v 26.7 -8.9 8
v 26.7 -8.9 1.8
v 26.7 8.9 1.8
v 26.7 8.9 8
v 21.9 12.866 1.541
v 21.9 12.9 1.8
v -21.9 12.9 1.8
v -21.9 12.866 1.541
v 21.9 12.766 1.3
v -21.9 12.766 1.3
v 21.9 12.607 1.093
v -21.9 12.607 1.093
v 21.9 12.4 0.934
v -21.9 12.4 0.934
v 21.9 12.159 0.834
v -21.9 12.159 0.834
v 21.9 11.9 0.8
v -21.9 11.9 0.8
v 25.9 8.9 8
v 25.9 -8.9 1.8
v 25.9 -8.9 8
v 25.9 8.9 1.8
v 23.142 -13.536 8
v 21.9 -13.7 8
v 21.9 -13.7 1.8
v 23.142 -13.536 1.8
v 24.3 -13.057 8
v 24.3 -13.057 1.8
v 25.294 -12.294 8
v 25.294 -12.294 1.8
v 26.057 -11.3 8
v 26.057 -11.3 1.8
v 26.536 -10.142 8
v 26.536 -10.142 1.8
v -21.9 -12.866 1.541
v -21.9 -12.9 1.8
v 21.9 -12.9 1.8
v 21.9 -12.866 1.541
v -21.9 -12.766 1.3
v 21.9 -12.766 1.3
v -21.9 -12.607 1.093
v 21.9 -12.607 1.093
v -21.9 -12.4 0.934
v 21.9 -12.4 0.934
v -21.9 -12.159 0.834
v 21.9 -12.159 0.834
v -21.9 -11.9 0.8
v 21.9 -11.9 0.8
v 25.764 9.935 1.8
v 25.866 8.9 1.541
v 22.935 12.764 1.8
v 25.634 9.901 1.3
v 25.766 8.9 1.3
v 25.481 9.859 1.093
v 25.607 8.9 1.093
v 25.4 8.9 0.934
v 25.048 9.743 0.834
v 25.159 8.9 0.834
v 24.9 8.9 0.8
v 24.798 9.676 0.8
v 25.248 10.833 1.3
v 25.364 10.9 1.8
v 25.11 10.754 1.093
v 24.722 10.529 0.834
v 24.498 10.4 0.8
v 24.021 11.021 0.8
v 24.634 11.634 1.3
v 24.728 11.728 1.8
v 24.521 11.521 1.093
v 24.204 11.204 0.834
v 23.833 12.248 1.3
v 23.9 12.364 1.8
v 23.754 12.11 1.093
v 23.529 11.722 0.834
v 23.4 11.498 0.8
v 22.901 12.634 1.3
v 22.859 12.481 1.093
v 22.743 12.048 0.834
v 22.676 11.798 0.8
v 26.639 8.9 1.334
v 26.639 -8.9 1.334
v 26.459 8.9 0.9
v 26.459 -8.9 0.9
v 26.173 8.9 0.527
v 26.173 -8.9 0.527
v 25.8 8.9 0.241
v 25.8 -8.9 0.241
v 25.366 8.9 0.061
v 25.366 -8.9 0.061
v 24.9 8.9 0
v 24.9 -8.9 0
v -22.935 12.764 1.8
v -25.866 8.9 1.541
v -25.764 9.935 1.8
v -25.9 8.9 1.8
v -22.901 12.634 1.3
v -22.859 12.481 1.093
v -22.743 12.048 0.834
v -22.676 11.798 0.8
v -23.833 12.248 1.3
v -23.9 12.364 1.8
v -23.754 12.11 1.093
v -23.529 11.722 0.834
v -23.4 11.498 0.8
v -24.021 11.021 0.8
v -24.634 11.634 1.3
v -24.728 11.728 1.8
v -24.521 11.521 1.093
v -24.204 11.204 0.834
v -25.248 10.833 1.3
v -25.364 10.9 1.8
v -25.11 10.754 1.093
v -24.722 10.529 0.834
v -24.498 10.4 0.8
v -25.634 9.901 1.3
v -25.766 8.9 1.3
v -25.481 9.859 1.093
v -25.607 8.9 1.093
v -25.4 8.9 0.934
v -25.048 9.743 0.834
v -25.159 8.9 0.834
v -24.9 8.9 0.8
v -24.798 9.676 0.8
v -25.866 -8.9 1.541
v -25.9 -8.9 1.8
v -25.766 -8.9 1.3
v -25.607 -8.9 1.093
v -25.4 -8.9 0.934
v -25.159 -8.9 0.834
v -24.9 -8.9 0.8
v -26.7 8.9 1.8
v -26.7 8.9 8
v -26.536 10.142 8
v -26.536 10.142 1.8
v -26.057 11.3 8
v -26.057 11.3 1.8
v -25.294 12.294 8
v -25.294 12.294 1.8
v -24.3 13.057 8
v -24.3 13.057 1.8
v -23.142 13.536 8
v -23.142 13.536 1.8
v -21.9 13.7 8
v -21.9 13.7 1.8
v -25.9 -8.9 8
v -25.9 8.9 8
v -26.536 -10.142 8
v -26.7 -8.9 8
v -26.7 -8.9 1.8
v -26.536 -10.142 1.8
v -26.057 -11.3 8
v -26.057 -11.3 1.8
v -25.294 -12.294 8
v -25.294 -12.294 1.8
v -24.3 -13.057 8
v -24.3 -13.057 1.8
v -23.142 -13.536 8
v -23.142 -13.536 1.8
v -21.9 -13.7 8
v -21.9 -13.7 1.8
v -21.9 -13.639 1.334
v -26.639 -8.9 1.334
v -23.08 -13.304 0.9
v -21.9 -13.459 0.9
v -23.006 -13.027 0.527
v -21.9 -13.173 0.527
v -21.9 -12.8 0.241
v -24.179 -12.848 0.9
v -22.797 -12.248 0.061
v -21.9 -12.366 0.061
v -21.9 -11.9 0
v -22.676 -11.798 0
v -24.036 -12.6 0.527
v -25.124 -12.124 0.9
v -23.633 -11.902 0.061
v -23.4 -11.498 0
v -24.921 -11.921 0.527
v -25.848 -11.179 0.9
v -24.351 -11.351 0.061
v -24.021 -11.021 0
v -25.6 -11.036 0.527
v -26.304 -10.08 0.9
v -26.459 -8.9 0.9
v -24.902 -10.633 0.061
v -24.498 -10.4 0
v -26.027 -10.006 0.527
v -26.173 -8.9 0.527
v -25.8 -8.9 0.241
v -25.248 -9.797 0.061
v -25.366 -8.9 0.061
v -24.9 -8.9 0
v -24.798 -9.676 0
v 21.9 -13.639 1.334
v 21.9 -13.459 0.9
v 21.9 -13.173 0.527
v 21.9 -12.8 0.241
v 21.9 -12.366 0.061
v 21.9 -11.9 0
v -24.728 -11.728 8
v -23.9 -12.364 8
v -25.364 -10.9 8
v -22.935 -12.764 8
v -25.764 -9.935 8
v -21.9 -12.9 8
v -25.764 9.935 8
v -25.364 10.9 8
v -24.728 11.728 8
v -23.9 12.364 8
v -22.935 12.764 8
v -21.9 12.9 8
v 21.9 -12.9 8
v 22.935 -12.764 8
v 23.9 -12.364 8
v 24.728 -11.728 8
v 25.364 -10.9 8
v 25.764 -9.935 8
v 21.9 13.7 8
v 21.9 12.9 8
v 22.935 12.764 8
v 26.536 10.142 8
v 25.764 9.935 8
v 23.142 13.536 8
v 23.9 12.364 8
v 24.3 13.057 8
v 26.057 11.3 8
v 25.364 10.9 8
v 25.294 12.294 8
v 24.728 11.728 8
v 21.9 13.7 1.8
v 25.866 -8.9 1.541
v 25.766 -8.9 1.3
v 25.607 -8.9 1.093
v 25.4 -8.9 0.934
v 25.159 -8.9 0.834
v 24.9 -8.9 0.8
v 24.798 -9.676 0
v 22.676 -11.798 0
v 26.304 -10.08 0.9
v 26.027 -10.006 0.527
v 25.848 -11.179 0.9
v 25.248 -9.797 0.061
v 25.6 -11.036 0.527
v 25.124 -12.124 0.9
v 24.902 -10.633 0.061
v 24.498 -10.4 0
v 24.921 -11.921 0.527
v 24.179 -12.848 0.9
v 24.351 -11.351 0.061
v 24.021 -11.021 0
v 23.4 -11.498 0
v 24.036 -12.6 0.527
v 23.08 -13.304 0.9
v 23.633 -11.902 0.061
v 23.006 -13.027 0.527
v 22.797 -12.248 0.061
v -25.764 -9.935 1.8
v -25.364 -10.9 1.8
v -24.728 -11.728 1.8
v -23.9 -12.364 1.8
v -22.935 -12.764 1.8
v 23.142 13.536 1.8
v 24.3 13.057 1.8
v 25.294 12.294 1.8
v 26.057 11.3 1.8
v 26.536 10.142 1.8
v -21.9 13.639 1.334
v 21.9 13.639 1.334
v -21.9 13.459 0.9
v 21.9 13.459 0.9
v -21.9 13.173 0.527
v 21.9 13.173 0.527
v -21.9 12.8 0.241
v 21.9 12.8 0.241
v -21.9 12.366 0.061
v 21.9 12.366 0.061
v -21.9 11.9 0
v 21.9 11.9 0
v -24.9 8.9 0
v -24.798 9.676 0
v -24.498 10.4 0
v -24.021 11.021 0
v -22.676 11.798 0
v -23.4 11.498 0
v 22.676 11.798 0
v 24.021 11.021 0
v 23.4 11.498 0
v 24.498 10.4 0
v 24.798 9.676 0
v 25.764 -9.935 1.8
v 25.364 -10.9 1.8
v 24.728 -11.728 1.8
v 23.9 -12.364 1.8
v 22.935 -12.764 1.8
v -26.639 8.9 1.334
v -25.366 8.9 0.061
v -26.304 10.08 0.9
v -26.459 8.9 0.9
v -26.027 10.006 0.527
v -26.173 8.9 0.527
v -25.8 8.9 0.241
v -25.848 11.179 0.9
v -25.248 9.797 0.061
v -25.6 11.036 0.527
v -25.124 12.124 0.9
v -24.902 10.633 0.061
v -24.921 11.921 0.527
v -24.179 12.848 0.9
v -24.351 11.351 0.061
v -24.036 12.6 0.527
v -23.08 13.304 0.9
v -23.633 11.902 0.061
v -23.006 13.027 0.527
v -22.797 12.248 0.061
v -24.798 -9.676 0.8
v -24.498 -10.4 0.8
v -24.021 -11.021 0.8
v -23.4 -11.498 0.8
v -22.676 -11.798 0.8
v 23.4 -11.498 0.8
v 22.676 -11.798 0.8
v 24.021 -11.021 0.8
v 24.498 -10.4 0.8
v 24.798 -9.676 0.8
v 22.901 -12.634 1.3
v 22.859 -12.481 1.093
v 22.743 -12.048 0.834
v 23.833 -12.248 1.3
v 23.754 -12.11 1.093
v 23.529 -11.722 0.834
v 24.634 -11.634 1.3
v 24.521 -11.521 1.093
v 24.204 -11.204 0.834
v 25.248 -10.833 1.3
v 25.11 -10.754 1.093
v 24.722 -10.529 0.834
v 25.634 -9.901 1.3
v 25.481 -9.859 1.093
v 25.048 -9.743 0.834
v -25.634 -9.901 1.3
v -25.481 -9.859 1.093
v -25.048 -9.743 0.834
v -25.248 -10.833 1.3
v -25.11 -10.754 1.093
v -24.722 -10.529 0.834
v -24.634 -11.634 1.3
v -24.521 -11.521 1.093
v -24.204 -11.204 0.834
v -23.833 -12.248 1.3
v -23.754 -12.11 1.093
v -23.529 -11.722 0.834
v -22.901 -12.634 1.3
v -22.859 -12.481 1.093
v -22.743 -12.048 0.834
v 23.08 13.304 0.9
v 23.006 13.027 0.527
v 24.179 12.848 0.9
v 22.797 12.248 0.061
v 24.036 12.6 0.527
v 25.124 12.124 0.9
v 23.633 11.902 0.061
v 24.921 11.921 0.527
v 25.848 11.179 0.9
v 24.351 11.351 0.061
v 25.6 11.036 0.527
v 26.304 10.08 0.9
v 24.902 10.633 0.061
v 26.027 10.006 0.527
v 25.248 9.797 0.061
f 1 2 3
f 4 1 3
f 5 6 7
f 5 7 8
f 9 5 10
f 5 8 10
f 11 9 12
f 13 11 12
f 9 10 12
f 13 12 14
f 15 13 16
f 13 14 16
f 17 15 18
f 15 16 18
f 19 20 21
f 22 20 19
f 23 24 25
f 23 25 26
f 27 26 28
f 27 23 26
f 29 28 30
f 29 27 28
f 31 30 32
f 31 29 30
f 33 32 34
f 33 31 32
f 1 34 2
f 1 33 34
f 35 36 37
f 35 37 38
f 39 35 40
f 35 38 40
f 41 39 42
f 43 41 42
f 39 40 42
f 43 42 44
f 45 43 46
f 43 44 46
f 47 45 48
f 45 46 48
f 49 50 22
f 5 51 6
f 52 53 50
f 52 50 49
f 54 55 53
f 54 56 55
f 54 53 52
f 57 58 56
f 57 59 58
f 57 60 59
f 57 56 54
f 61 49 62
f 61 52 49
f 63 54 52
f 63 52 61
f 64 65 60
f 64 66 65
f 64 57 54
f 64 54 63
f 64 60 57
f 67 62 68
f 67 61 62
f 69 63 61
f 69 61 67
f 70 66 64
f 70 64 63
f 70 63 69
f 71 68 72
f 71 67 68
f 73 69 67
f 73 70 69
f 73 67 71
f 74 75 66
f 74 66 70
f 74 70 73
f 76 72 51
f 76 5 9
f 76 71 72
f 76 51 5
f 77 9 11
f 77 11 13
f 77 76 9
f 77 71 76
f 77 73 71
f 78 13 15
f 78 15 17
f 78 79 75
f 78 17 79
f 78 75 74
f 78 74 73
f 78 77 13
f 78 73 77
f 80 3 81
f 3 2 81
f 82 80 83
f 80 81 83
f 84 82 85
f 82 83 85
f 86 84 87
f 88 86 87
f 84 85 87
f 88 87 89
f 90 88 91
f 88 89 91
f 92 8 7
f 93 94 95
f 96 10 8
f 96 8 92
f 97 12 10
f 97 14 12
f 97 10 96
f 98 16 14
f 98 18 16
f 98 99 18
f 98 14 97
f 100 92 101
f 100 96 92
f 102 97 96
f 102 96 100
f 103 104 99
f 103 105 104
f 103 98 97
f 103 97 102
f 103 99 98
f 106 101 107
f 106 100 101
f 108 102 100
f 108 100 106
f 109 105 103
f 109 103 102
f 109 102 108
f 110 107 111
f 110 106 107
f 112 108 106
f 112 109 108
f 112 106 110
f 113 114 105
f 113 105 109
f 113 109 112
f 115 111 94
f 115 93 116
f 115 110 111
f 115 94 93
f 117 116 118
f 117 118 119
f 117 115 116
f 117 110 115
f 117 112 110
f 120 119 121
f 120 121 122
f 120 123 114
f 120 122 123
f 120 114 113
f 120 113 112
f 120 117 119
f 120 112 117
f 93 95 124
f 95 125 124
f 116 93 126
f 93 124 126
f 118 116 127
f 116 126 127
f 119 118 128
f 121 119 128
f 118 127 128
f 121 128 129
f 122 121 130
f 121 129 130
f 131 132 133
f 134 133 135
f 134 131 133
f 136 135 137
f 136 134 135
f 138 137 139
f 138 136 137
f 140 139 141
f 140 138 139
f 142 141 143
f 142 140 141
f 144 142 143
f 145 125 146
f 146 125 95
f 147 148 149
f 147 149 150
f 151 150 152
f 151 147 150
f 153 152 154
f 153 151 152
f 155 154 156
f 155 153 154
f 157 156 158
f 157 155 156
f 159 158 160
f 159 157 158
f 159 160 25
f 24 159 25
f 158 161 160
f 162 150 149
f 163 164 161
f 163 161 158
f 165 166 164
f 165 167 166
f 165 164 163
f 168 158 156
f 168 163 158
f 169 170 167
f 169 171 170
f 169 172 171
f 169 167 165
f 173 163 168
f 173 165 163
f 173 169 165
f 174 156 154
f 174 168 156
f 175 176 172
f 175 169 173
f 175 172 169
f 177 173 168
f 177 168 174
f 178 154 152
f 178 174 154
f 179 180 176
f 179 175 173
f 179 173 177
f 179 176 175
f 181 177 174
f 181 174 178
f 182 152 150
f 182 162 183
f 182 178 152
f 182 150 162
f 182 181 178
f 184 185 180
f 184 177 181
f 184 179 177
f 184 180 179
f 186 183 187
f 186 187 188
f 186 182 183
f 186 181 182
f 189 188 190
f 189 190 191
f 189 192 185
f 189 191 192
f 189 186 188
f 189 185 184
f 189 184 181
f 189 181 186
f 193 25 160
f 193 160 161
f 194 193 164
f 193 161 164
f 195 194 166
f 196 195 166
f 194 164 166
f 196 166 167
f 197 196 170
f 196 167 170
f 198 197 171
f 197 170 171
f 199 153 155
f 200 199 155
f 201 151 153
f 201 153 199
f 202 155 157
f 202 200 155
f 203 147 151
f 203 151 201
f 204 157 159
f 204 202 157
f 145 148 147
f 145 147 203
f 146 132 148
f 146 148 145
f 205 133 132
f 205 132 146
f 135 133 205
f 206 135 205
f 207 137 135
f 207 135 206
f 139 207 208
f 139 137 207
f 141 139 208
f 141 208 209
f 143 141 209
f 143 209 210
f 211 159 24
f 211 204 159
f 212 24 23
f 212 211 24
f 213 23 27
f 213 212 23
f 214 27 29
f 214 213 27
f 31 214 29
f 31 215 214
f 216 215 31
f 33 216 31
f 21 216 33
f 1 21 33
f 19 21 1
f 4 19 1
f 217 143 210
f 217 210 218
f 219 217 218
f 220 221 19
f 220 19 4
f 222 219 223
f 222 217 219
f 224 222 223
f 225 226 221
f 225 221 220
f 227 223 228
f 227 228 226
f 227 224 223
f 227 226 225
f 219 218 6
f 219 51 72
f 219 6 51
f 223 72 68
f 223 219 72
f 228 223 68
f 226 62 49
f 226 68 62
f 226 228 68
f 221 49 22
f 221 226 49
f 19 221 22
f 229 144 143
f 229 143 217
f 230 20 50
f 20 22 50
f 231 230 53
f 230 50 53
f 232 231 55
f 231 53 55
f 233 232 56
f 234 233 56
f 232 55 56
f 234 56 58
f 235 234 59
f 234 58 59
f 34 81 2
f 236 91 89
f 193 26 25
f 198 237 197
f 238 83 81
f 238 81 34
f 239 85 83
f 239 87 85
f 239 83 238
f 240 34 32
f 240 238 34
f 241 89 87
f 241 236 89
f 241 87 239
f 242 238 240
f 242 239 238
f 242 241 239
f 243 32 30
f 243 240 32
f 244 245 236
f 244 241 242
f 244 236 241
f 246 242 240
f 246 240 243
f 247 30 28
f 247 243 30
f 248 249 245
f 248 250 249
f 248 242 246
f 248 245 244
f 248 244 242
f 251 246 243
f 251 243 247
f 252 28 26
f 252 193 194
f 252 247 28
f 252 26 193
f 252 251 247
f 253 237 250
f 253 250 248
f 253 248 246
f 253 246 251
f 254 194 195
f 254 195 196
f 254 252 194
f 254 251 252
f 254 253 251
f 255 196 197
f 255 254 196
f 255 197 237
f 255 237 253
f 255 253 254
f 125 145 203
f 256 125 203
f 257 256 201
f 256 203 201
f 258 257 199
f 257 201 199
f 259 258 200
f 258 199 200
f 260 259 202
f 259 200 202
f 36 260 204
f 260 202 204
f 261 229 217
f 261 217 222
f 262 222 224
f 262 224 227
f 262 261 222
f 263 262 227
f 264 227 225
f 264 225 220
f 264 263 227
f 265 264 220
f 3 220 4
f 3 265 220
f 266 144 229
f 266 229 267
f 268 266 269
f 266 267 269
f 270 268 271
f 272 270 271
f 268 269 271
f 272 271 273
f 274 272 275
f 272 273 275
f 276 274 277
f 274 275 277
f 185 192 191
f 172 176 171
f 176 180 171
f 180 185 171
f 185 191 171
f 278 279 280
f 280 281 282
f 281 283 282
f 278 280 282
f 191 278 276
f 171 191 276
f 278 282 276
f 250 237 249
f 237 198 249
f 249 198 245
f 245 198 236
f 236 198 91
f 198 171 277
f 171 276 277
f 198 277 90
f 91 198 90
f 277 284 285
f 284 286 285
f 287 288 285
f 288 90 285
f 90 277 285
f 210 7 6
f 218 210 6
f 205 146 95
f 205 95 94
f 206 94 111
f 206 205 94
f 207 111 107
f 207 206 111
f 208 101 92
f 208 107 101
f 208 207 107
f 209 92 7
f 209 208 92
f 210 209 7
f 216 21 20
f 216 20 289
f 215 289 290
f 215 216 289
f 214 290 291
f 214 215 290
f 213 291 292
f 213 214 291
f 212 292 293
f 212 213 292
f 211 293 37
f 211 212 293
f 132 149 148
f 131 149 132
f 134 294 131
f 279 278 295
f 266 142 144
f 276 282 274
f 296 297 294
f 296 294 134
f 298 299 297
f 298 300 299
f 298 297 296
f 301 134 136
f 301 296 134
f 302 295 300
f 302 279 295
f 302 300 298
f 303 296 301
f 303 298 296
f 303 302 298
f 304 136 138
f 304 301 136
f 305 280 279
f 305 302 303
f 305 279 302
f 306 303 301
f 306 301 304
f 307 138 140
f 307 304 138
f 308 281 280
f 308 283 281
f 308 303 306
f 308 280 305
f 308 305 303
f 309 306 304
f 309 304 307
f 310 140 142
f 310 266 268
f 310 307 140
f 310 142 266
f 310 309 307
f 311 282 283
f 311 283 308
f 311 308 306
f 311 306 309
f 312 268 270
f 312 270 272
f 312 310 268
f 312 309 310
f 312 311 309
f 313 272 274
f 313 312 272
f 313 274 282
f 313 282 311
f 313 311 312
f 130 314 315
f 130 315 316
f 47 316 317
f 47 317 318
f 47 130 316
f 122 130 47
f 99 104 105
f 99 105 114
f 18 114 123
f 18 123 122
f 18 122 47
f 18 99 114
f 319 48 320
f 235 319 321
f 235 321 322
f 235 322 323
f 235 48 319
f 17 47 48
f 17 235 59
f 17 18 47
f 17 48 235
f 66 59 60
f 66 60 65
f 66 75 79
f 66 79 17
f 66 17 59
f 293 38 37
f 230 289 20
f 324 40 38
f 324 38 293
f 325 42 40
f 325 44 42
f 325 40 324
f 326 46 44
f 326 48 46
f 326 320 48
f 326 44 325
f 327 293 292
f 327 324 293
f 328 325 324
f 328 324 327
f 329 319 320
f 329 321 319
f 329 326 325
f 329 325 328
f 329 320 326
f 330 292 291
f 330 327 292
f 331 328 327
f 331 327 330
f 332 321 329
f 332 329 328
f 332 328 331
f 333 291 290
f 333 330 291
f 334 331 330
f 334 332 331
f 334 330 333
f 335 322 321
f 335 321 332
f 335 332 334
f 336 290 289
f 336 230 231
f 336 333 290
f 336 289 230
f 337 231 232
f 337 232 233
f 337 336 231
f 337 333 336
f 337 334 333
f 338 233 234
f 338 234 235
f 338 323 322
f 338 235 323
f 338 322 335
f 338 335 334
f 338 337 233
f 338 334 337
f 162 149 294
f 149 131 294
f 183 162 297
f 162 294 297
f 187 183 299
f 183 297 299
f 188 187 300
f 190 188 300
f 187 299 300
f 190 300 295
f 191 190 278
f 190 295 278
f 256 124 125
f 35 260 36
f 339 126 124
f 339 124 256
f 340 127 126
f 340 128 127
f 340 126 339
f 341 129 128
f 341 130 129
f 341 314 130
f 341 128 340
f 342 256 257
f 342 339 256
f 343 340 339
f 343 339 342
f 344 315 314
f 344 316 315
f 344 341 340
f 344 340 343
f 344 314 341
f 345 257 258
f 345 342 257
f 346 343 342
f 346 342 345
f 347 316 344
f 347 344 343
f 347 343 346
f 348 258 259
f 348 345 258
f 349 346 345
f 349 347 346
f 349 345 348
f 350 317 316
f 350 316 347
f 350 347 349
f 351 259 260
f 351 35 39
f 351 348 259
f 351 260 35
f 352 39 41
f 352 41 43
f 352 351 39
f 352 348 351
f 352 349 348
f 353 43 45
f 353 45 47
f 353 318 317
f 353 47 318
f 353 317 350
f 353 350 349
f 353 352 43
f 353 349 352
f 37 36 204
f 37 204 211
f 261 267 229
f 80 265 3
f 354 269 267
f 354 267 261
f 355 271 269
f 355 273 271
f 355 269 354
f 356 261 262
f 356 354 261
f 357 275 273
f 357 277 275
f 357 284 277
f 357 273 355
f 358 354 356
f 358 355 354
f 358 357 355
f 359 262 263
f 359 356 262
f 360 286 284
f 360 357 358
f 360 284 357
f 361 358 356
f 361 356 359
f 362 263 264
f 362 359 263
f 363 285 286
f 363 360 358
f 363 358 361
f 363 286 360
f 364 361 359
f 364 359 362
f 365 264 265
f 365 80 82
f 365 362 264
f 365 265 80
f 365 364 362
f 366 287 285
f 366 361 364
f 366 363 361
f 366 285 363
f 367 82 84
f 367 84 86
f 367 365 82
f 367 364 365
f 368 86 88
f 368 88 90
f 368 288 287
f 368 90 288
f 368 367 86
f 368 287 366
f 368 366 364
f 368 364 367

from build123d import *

# Parameters (mm, degrees)
F0_W     = 53.4
F0_H     = 27.4
F0_W_2   = 51.8
F0_H_2   = 25.8
F1_DEPTH = 0.8
F2_DEPTH = 8
F3_R     = 4
F4_R     = 4.8
F5_R     = 1
F6_R     = 1.8


with BuildPart() as f1:
    # F0 (on Top) → F1 (new body)
    with BuildSketch(Plane.XY):
        Rectangle(F0_W, F0_H)
        Rectangle(F0_W_2, F0_H_2, mode=Mode.SUBTRACT)
        Rectangle(F0_W_2, F0_H_2)
    extrude(amount=F1_DEPTH)

    # F0 (on Top) → F2 (join)
    with BuildSketch(Plane.XY):
        Rectangle(F0_W, F0_H)
        Rectangle(F0_W_2, F0_H_2, mode=Mode.SUBTRACT)
    extrude(amount=F2_DEPTH)

    # F3
    f3_edges = [f1.edges().sort_by_distance(p)[0] for p in [
        (-25.9, 12.9, 4.4),
        (25.9, 12.9, 4.4),
        (25.9, -12.9, 4.4),
        (-25.9, -12.9, 4.4),
    ]]
    fillet(f3_edges, radius=F3_R)

    # F4
    f4_edges = [f1.edges().sort_by_distance(p)[0] for p in [
        (26.7, 13.7, 4),
        (26.7, -13.7, 4),
        (-26.7, 13.7, 4),
        (-26.7, -13.7, 4),
    ]]
    fillet(f4_edges, radius=F4_R)

    # F5
    f5_edges = [f1.edges().sort_by_distance(p)[0] for p in [
        (0, 12.9, 0.8),
    ]]
    fillet(f5_edges, radius=F5_R)

    # F6
    f6_edges = [f1.edges().sort_by_distance(p)[0] for p in [
        (0, 13.7, 0),
    ]]
    fillet(f6_edges, radius=F6_R)


solid = f1.part
